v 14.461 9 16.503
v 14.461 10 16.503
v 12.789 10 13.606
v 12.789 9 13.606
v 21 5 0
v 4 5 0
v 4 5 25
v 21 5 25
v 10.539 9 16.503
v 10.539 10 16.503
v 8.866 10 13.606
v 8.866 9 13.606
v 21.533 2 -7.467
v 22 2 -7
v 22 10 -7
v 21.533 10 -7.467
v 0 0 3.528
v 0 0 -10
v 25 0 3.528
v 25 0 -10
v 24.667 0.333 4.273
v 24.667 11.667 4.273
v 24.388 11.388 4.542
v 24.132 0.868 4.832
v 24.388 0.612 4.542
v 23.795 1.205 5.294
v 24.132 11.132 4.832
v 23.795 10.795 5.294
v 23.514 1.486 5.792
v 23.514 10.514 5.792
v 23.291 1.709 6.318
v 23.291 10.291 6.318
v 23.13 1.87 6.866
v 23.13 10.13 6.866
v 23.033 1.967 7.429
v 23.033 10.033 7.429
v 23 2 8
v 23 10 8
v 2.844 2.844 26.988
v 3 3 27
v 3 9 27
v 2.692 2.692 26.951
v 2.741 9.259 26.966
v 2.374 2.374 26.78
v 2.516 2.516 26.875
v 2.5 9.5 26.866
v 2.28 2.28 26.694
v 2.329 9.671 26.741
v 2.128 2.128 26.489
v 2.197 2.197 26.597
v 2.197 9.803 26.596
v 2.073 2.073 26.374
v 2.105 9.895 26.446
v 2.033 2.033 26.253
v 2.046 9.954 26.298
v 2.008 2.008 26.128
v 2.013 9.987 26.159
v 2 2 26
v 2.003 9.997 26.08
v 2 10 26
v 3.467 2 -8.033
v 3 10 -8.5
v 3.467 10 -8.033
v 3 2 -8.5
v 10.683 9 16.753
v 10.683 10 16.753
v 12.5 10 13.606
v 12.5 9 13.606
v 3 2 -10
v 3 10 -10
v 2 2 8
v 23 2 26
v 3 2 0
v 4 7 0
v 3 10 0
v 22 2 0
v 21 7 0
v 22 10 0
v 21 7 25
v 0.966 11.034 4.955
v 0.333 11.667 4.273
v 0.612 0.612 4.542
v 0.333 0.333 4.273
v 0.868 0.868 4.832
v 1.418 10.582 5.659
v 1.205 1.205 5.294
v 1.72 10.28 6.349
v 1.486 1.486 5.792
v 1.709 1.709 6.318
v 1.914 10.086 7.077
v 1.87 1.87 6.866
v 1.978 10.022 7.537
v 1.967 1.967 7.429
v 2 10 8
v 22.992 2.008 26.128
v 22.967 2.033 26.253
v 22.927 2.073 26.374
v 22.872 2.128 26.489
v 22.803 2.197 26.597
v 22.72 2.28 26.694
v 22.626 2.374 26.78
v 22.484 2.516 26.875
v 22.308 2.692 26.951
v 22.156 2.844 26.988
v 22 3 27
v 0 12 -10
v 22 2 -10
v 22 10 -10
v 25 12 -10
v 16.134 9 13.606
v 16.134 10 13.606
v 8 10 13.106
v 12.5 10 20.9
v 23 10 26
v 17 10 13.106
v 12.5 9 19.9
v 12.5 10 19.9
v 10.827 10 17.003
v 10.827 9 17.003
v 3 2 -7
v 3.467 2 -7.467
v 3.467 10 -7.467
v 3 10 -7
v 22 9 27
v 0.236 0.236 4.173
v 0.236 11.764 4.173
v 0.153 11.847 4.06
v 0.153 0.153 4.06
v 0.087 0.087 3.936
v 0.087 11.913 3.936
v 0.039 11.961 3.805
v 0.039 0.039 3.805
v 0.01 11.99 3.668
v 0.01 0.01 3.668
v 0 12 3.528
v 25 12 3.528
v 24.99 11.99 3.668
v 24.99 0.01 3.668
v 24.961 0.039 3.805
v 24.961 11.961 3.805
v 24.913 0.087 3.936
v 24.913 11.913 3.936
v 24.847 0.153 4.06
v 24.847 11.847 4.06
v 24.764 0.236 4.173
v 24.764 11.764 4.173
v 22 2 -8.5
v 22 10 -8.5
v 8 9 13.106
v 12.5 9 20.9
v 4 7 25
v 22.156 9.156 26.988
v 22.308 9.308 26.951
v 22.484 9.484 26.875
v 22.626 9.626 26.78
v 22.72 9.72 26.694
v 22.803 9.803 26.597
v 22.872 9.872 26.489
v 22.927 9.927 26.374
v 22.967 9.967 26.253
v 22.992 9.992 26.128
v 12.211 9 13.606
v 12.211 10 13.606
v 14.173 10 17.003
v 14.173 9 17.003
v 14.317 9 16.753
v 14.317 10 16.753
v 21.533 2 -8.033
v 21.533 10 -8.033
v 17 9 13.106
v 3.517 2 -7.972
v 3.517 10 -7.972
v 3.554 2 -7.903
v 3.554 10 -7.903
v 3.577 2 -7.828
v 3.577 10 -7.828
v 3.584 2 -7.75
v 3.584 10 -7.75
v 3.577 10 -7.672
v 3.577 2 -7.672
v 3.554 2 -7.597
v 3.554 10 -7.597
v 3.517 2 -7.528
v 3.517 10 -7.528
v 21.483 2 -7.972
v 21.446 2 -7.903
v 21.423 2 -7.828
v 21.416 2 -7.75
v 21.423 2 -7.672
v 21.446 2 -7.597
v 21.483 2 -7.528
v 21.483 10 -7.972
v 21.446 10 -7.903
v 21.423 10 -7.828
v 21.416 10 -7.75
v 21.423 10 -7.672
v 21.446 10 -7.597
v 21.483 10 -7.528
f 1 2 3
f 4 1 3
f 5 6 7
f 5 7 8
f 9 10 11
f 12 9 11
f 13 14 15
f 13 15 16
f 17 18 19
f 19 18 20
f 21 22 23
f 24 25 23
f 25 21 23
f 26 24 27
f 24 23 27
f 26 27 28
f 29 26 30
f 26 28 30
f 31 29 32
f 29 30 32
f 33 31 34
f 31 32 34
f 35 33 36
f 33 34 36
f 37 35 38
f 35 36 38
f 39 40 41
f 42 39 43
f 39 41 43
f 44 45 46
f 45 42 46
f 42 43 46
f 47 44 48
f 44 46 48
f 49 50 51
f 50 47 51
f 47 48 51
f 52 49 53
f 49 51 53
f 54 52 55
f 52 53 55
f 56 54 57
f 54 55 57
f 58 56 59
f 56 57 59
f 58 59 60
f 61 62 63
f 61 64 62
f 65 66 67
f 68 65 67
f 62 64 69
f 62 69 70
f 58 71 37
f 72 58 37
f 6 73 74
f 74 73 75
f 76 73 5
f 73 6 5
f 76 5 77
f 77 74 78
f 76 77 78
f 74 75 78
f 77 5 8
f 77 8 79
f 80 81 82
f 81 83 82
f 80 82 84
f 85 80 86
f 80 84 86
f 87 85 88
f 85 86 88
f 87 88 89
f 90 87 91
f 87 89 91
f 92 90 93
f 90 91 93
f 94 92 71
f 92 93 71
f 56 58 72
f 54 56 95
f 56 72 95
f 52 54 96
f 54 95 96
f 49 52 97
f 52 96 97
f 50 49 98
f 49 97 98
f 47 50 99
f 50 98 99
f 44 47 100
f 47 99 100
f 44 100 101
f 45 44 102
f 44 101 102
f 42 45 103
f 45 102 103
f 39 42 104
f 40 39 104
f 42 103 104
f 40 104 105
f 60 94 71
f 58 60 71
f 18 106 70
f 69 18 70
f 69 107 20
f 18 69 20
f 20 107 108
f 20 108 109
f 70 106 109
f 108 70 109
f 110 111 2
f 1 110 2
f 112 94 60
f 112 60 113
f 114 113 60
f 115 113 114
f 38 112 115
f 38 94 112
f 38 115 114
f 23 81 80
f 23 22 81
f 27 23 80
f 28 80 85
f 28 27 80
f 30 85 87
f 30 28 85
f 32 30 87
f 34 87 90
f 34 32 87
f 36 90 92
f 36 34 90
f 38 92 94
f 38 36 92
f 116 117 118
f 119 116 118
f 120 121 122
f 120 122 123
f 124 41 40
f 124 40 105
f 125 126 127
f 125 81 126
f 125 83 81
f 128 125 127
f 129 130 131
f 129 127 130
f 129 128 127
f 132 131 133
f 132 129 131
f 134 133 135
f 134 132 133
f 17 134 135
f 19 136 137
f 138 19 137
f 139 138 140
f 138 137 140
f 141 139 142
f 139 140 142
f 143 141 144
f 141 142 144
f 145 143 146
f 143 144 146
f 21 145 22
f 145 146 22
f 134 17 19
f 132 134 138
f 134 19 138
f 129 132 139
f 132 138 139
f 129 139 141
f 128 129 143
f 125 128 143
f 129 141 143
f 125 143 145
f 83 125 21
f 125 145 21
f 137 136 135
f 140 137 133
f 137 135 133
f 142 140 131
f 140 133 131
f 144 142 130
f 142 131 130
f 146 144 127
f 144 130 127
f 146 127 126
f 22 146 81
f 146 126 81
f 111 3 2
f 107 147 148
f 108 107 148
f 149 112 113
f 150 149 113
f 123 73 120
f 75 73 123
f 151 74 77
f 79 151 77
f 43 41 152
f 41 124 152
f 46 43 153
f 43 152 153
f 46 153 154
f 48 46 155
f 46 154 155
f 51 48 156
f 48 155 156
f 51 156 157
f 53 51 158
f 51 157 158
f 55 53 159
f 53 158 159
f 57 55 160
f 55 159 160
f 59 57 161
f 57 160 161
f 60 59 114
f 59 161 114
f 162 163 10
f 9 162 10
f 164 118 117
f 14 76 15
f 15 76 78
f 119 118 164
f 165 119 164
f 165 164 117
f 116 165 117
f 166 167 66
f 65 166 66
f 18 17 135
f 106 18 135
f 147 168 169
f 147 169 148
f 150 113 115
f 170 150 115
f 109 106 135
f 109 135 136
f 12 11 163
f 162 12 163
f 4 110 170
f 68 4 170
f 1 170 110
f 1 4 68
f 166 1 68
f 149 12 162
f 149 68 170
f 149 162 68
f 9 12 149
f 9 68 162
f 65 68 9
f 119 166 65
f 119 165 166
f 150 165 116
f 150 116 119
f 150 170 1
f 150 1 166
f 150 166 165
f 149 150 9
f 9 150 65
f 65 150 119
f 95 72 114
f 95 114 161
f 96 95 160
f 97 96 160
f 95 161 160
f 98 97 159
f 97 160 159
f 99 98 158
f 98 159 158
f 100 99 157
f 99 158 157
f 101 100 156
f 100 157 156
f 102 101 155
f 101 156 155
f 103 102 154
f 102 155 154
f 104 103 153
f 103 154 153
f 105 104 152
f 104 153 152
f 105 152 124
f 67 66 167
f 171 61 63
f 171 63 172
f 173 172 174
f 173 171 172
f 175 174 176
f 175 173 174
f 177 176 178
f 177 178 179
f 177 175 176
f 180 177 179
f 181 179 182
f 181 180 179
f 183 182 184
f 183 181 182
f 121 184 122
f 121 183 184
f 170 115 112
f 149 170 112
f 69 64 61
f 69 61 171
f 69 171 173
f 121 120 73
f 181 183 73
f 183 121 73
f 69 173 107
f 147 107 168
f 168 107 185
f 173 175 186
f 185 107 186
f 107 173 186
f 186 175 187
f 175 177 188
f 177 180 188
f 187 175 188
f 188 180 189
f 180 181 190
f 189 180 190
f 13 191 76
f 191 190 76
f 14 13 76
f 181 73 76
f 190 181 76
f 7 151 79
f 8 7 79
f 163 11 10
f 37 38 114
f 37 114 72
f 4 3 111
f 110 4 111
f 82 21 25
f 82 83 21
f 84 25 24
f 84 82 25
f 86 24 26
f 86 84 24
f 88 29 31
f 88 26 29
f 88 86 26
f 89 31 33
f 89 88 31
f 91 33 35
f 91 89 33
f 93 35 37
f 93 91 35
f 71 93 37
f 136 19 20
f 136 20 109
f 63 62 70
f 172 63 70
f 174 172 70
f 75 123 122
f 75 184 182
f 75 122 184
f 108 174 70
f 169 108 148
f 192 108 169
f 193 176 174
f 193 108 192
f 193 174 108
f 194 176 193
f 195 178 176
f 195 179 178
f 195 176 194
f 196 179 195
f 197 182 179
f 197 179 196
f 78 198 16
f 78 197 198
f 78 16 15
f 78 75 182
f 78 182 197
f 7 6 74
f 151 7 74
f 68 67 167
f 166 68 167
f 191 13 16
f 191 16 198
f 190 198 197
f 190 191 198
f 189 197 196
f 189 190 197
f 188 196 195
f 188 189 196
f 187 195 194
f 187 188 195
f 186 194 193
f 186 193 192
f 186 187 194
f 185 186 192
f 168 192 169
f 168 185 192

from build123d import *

# Parameters (mm, degrees)
F0_W           = 25
F0_H           = 12
F0_W_2         = 19
F0_H_2         = 8
F1_DEPTH       = 10
F2_W           = 21
F2_H           = 8
F2_W_2         = 17
F2_H_2         = 2
F3_DEPTH       = 25
F4_W           = 21
F4_H           = 8
F4_W_2         = 17
F4_H_2         = 2
F5_DEPTH       = 2
F6_W           = 25
F6_H           = 12
F7_DEPTH       = 4
F10_DEPTH      = 4
F10_DEPTH_BACK = 4
F11_T1_DEPTH   = 21
F11_T3_DEPTH   = 8
F11_T9_DEPTH   = 31
F11_T14_DEPTH  = 18
F11_T22_DEPTH  = 31
F11_T27_DEPTH  = 18
F11_T35_DEPTH  = 31
F11_T40_DEPTH  = 18
F11_T48_DEPTH  = 18
F11_T53_DEPTH  = 31
F12_R          = 1
F14_DEPTH      = 1


# Not quite as in the source:
# - a fillet or chamfer that OpenCascade refuses, or shapes differently, is made with other operations: its cross-section is extruded or revolved along the edge and cut away or added


with BuildPart() as f1:
    # F0 (on Top) → F1 (new body)
    with BuildSketch(Plane.XY):
        with Locations((12.5, 6)):
            Rectangle(F0_W, F0_H)
        with Locations((12.5, 6)):
            Rectangle(F0_W_2, F0_H_2, mode=Mode.SUBTRACT)
    extrude(amount=-F1_DEPTH)

    # F2 (on Top) → F3 (join)
    with BuildSketch(Plane.XY):
        with Locations((12.5, 6)):
            Rectangle(F2_W, F2_H)
        with Locations((12.5, 6)):
            Rectangle(F2_W_2, F2_H_2, mode=Mode.SUBTRACT)
    extrude(amount=F3_DEPTH)

    # F4 (on face) → F5 (join)
    with BuildSketch(Plane.XY.offset(25)):
        with Locations((12.5, 6)):
            Rectangle(F4_W, F4_H)
        with Locations((12.5, 6)):
            Rectangle(F4_W_2, F4_H_2, mode=Mode.SUBTRACT)
        with Locations((12.5, 6)):
            Rectangle(F4_W_2, F4_H_2)
    extrude(amount=F5_DEPTH)

    # F6 (on face) → F7 (join)
    with BuildSketch(Plane.XY):
        with Locations((12.5, 6)):
            Rectangle(F6_W, F6_H)
        Polygon((23, 2), (22, 2), (3, 2), (2, 2), (2, 10), (3, 10), (22, 10), (23, 10), align=None, mode=Mode.SUBTRACT)
    extrude(amount=F7_DEPTH)

    # F9 (on offset) → F10 (join, two sides)
    with BuildSketch(Plane.XZ.offset(-6)) as f10_sk:
        with BuildLine():
            Line((3, -7), (3, -8.5))
            Line((3, -8.5), (3.4671572875, -8.0328427125))
            ThreePointArc((3.4671572875, -8.0328427125), (3.5843145751, -7.75), (3.4671572875, -7.4671572875))
            Line((3.4671572875, -7.4671572875), (3, -7))
        make_face()
        with BuildLine():
            Line((21.5328427125, -8.0328427125), (22, -8.5))
            Line((22, -8.5), (22, -7))
            Line((22, -7), (21.5328427125, -7.4671572875))
            ThreePointArc((21.5328427125, -7.4671572875), (21.4156854249, -7.75), (21.5328427125, -8.0328427125))
        make_face()
    extrude(amount=F10_DEPTH)
    extrude(f10_sk.sketch, amount=-F10_DEPTH_BACK)

    # F11: fillet of radius 5 on 4 edges, made by hand

    # F11_s2 → F11_t1 (join)
    with BuildSketch(Plane.YZ.offset(2)):
        with BuildLine():
            ThreePointArc((0, 4), (1.472135955, 5.7639320225), (2, 8))
            Line((2, 8), (2, 4))
            Line((2, 4), (0, 4))
        make_face()
        with BuildLine():
            ThreePointArc((12, 4), (10.527864045, 5.7639320225), (10, 8))
            Line((10, 8), (10, 4))
            Line((10, 4), (12, 4))
        make_face()
    extrude(amount=F11_T1_DEPTH)

    # F11_s4 → F11_t3 (join)
    with BuildSketch(Plane.XZ.offset(-10)):
        with BuildLine():
            ThreePointArc((25, 4), (23.527864045, 5.7639320225), (23, 8))
            Line((23, 8), (23, 4))
            Line((23, 4), (25, 4))
        make_face()
        with BuildLine():
            ThreePointArc((0, 4), (1.472135955, 5.7639320225), (2, 8))
            Line((2, 8), (2, 4))
            Line((2, 4), (0, 4))
        make_face()
    extrude(amount=F11_T3_DEPTH)


with BuildPart() as f11_tool7:
    # F11_s8 → F11_t9 (new body)
    with BuildSketch(Plane.YZ.offset(-8)):
        with BuildLine():
            ThreePointArc((0, 4), (1.472135955, 5.7639320225), (2, 8))
            Line((2, 8), (2, 4))
            Line((2, 4), (0, 4))
        make_face()
    extrude(amount=F11_T9_DEPTH)

    split(bisect_by=Plane.YZ, keep=Keep.TOP)

    split(bisect_by=Plane.YZ.offset(2), keep=Keep.BOTTOM)


with BuildPart() as f11_tool12:
    # F11_s13 → F11_t14 (new body)
    with BuildSketch(Plane.XZ.offset(8)):
        with BuildLine():
            ThreePointArc((0, 4), (1.472135955, 5.7639320225), (2, 8))
            Line((2, 8), (2, 4))
            Line((2, 4), (0, 4))
        make_face()
    extrude(amount=-F11_T14_DEPTH)

    split(bisect_by=Plane.XZ, keep=Keep.BOTTOM)

    split(bisect_by=Plane.XZ.offset(-2), keep=Keep.TOP)


with BuildPart() as f11_tool7_1:
    add(f11_tool7.part)

    # F11_t17: intersect F11_tool12
    add(f11_tool12.part, mode=Mode.INTERSECT)


with BuildPart() as f1_1:
    add(f1.part)

    # F11_t5: union F11_tool7
    add(f11_tool7_1.part)


with BuildPart() as f11_tool20:
    # F11_s21 → F11_t22 (new body)
    with BuildSketch(Plane.YZ.offset(2)):
        with BuildLine():
            ThreePointArc((0, 4), (1.472135955, 5.7639320225), (2, 8))
            Line((2, 8), (2, 4))
            Line((2, 4), (0, 4))
        make_face()
    extrude(amount=F11_T22_DEPTH)

    split(bisect_by=Plane.YZ.offset(25), keep=Keep.BOTTOM)

    split(bisect_by=Plane.YZ.offset(23), keep=Keep.TOP)


with BuildPart() as f11_tool25:
    # F11_s26 → F11_t27 (new body)
    with BuildSketch(Plane.XZ.offset(-10)):
        with BuildLine():
            ThreePointArc((25, 4), (23.527864045, 5.7639320225), (23, 8))
            Line((23, 8), (23, 4))
            Line((23, 4), (25, 4))
        make_face()
    extrude(amount=F11_T27_DEPTH)

    split(bisect_by=Plane.XZ, keep=Keep.BOTTOM)

    split(bisect_by=Plane.XZ.offset(-2), keep=Keep.TOP)


with BuildPart() as f11_tool20_1:
    add(f11_tool20.part)

    # F11_t30: intersect F11_tool25
    add(f11_tool25.part, mode=Mode.INTERSECT)


with BuildPart() as f1_2:
    add(f1_1.part)

    # F11_t18: union F11_tool20
    add(f11_tool20_1.part)


with BuildPart() as f11_tool33:
    # F11_s34 → F11_t35 (new body)
    with BuildSketch(Plane.YZ.offset(33)):
        with BuildLine():
            ThreePointArc((12, 4), (10.527864045, 5.7639320225), (10, 8))
            Line((10, 8), (10, 4))
            Line((10, 4), (12, 4))
        make_face()
    extrude(amount=-F11_T35_DEPTH)

    split(bisect_by=Plane.YZ.offset(25), keep=Keep.BOTTOM)

    split(bisect_by=Plane.YZ.offset(23), keep=Keep.TOP)


with BuildPart() as f11_tool38:
    # F11_s39 → F11_t40 (new body)
    with BuildSketch(Plane.XZ.offset(-20)):
        with BuildLine():
            ThreePointArc((25, 4), (23.527864045, 5.7639320225), (23, 8))
            Line((23, 8), (23, 4))
            Line((23, 4), (25, 4))
        make_face()
    extrude(amount=F11_T40_DEPTH)

    split(bisect_by=Plane.XZ.offset(-12), keep=Keep.TOP)

    split(bisect_by=Plane.XZ.offset(-10), keep=Keep.BOTTOM)


with BuildPart() as f11_tool33_1:
    add(f11_tool33.part)

    # F11_t43: intersect F11_tool38
    add(f11_tool38.part, mode=Mode.INTERSECT)


with BuildPart() as f1_3:
    add(f1_2.part)

    # F11_t31: union F11_tool33
    add(f11_tool33_1.part)


with BuildPart() as f11_tool46:
    # F11_s47 → F11_t48 (new body)
    with BuildSketch(Plane.XZ.offset(-2)):
        with BuildLine():
            ThreePointArc((0, 4), (1.472135955, 5.7639320225), (2, 8))
            Line((2, 8), (2, 4))
            Line((2, 4), (0, 4))
        make_face()
    extrude(amount=-F11_T48_DEPTH)

    split(bisect_by=Plane.XZ.offset(-12), keep=Keep.TOP)

    split(bisect_by=Plane.XZ.offset(-10), keep=Keep.BOTTOM)


with BuildPart() as f11_tool51:
    # F11_s52 → F11_t53 (new body)
    with BuildSketch(Plane.YZ.offset(23)):
        with BuildLine():
            ThreePointArc((12, 4), (10.527864045, 5.7639320225), (10, 8))
            Line((10, 8), (10, 4))
            Line((10, 4), (12, 4))
        make_face()
    extrude(amount=-F11_T53_DEPTH)

    split(bisect_by=Plane.YZ, keep=Keep.TOP)

    split(bisect_by=Plane.YZ.offset(2), keep=Keep.BOTTOM)


with BuildPart() as f11_tool46_1:
    add(f11_tool46.part)

    # F11_t56: intersect F11_tool51
    add(f11_tool51.part, mode=Mode.INTERSECT)


with BuildPart() as f1_4:
    add(f1_3.part)

    # F11_t44: union F11_tool46
    add(f11_tool46_1.part)

    # F12
    f12_edges = [f1_4.edges().sort_by_distance(p)[0] for p in [
        (23, 6, 27),
        (12.5, 2, 27),
        (2, 6, 27),
        (12.5, 10, 27),
        (12.5, 12, 4),
        (25, 6, 4),
        (12.5, 0, 4),
        (0, 6, 4),
    ]]
    fillet(f12_edges, radius=F12_R)

    # F13 (on face) → F14 (cut)
    with BuildSketch(Plane(origin=(0, 10, 0), x_dir=(-1, 0, 0), z_dir=(0, 1, 0))):
        Polygon((-12.5, 20.9), (-17, 13.1057713659), (-8, 13.1057713659), align=None)
        Polygon((-16.1339745962, 13.6057713659), (-14.4613248654, 16.502885683), (-12.7886751346, 13.6057713659), align=None, mode=Mode.SUBTRACT)
        Polygon((-12.5, 13.6057713659), (-14.3169872981, 16.752885683), (-10.6830127019, 16.752885683), align=None, mode=Mode.SUBTRACT)
        Polygon((-8.8660254038, 13.6057713659), (-12.2113248654, 13.6057713659), (-10.5386751346, 16.502885683), align=None, mode=Mode.SUBTRACT)
        Polygon((-12.5, 19.9), (-10.8273502692, 17.002885683), (-14.1726497308, 17.002885683), align=None, mode=Mode.SUBTRACT)
    extrude(amount=-F14_DEPTH, mode=Mode.SUBTRACT)


solid = f1_4.part
